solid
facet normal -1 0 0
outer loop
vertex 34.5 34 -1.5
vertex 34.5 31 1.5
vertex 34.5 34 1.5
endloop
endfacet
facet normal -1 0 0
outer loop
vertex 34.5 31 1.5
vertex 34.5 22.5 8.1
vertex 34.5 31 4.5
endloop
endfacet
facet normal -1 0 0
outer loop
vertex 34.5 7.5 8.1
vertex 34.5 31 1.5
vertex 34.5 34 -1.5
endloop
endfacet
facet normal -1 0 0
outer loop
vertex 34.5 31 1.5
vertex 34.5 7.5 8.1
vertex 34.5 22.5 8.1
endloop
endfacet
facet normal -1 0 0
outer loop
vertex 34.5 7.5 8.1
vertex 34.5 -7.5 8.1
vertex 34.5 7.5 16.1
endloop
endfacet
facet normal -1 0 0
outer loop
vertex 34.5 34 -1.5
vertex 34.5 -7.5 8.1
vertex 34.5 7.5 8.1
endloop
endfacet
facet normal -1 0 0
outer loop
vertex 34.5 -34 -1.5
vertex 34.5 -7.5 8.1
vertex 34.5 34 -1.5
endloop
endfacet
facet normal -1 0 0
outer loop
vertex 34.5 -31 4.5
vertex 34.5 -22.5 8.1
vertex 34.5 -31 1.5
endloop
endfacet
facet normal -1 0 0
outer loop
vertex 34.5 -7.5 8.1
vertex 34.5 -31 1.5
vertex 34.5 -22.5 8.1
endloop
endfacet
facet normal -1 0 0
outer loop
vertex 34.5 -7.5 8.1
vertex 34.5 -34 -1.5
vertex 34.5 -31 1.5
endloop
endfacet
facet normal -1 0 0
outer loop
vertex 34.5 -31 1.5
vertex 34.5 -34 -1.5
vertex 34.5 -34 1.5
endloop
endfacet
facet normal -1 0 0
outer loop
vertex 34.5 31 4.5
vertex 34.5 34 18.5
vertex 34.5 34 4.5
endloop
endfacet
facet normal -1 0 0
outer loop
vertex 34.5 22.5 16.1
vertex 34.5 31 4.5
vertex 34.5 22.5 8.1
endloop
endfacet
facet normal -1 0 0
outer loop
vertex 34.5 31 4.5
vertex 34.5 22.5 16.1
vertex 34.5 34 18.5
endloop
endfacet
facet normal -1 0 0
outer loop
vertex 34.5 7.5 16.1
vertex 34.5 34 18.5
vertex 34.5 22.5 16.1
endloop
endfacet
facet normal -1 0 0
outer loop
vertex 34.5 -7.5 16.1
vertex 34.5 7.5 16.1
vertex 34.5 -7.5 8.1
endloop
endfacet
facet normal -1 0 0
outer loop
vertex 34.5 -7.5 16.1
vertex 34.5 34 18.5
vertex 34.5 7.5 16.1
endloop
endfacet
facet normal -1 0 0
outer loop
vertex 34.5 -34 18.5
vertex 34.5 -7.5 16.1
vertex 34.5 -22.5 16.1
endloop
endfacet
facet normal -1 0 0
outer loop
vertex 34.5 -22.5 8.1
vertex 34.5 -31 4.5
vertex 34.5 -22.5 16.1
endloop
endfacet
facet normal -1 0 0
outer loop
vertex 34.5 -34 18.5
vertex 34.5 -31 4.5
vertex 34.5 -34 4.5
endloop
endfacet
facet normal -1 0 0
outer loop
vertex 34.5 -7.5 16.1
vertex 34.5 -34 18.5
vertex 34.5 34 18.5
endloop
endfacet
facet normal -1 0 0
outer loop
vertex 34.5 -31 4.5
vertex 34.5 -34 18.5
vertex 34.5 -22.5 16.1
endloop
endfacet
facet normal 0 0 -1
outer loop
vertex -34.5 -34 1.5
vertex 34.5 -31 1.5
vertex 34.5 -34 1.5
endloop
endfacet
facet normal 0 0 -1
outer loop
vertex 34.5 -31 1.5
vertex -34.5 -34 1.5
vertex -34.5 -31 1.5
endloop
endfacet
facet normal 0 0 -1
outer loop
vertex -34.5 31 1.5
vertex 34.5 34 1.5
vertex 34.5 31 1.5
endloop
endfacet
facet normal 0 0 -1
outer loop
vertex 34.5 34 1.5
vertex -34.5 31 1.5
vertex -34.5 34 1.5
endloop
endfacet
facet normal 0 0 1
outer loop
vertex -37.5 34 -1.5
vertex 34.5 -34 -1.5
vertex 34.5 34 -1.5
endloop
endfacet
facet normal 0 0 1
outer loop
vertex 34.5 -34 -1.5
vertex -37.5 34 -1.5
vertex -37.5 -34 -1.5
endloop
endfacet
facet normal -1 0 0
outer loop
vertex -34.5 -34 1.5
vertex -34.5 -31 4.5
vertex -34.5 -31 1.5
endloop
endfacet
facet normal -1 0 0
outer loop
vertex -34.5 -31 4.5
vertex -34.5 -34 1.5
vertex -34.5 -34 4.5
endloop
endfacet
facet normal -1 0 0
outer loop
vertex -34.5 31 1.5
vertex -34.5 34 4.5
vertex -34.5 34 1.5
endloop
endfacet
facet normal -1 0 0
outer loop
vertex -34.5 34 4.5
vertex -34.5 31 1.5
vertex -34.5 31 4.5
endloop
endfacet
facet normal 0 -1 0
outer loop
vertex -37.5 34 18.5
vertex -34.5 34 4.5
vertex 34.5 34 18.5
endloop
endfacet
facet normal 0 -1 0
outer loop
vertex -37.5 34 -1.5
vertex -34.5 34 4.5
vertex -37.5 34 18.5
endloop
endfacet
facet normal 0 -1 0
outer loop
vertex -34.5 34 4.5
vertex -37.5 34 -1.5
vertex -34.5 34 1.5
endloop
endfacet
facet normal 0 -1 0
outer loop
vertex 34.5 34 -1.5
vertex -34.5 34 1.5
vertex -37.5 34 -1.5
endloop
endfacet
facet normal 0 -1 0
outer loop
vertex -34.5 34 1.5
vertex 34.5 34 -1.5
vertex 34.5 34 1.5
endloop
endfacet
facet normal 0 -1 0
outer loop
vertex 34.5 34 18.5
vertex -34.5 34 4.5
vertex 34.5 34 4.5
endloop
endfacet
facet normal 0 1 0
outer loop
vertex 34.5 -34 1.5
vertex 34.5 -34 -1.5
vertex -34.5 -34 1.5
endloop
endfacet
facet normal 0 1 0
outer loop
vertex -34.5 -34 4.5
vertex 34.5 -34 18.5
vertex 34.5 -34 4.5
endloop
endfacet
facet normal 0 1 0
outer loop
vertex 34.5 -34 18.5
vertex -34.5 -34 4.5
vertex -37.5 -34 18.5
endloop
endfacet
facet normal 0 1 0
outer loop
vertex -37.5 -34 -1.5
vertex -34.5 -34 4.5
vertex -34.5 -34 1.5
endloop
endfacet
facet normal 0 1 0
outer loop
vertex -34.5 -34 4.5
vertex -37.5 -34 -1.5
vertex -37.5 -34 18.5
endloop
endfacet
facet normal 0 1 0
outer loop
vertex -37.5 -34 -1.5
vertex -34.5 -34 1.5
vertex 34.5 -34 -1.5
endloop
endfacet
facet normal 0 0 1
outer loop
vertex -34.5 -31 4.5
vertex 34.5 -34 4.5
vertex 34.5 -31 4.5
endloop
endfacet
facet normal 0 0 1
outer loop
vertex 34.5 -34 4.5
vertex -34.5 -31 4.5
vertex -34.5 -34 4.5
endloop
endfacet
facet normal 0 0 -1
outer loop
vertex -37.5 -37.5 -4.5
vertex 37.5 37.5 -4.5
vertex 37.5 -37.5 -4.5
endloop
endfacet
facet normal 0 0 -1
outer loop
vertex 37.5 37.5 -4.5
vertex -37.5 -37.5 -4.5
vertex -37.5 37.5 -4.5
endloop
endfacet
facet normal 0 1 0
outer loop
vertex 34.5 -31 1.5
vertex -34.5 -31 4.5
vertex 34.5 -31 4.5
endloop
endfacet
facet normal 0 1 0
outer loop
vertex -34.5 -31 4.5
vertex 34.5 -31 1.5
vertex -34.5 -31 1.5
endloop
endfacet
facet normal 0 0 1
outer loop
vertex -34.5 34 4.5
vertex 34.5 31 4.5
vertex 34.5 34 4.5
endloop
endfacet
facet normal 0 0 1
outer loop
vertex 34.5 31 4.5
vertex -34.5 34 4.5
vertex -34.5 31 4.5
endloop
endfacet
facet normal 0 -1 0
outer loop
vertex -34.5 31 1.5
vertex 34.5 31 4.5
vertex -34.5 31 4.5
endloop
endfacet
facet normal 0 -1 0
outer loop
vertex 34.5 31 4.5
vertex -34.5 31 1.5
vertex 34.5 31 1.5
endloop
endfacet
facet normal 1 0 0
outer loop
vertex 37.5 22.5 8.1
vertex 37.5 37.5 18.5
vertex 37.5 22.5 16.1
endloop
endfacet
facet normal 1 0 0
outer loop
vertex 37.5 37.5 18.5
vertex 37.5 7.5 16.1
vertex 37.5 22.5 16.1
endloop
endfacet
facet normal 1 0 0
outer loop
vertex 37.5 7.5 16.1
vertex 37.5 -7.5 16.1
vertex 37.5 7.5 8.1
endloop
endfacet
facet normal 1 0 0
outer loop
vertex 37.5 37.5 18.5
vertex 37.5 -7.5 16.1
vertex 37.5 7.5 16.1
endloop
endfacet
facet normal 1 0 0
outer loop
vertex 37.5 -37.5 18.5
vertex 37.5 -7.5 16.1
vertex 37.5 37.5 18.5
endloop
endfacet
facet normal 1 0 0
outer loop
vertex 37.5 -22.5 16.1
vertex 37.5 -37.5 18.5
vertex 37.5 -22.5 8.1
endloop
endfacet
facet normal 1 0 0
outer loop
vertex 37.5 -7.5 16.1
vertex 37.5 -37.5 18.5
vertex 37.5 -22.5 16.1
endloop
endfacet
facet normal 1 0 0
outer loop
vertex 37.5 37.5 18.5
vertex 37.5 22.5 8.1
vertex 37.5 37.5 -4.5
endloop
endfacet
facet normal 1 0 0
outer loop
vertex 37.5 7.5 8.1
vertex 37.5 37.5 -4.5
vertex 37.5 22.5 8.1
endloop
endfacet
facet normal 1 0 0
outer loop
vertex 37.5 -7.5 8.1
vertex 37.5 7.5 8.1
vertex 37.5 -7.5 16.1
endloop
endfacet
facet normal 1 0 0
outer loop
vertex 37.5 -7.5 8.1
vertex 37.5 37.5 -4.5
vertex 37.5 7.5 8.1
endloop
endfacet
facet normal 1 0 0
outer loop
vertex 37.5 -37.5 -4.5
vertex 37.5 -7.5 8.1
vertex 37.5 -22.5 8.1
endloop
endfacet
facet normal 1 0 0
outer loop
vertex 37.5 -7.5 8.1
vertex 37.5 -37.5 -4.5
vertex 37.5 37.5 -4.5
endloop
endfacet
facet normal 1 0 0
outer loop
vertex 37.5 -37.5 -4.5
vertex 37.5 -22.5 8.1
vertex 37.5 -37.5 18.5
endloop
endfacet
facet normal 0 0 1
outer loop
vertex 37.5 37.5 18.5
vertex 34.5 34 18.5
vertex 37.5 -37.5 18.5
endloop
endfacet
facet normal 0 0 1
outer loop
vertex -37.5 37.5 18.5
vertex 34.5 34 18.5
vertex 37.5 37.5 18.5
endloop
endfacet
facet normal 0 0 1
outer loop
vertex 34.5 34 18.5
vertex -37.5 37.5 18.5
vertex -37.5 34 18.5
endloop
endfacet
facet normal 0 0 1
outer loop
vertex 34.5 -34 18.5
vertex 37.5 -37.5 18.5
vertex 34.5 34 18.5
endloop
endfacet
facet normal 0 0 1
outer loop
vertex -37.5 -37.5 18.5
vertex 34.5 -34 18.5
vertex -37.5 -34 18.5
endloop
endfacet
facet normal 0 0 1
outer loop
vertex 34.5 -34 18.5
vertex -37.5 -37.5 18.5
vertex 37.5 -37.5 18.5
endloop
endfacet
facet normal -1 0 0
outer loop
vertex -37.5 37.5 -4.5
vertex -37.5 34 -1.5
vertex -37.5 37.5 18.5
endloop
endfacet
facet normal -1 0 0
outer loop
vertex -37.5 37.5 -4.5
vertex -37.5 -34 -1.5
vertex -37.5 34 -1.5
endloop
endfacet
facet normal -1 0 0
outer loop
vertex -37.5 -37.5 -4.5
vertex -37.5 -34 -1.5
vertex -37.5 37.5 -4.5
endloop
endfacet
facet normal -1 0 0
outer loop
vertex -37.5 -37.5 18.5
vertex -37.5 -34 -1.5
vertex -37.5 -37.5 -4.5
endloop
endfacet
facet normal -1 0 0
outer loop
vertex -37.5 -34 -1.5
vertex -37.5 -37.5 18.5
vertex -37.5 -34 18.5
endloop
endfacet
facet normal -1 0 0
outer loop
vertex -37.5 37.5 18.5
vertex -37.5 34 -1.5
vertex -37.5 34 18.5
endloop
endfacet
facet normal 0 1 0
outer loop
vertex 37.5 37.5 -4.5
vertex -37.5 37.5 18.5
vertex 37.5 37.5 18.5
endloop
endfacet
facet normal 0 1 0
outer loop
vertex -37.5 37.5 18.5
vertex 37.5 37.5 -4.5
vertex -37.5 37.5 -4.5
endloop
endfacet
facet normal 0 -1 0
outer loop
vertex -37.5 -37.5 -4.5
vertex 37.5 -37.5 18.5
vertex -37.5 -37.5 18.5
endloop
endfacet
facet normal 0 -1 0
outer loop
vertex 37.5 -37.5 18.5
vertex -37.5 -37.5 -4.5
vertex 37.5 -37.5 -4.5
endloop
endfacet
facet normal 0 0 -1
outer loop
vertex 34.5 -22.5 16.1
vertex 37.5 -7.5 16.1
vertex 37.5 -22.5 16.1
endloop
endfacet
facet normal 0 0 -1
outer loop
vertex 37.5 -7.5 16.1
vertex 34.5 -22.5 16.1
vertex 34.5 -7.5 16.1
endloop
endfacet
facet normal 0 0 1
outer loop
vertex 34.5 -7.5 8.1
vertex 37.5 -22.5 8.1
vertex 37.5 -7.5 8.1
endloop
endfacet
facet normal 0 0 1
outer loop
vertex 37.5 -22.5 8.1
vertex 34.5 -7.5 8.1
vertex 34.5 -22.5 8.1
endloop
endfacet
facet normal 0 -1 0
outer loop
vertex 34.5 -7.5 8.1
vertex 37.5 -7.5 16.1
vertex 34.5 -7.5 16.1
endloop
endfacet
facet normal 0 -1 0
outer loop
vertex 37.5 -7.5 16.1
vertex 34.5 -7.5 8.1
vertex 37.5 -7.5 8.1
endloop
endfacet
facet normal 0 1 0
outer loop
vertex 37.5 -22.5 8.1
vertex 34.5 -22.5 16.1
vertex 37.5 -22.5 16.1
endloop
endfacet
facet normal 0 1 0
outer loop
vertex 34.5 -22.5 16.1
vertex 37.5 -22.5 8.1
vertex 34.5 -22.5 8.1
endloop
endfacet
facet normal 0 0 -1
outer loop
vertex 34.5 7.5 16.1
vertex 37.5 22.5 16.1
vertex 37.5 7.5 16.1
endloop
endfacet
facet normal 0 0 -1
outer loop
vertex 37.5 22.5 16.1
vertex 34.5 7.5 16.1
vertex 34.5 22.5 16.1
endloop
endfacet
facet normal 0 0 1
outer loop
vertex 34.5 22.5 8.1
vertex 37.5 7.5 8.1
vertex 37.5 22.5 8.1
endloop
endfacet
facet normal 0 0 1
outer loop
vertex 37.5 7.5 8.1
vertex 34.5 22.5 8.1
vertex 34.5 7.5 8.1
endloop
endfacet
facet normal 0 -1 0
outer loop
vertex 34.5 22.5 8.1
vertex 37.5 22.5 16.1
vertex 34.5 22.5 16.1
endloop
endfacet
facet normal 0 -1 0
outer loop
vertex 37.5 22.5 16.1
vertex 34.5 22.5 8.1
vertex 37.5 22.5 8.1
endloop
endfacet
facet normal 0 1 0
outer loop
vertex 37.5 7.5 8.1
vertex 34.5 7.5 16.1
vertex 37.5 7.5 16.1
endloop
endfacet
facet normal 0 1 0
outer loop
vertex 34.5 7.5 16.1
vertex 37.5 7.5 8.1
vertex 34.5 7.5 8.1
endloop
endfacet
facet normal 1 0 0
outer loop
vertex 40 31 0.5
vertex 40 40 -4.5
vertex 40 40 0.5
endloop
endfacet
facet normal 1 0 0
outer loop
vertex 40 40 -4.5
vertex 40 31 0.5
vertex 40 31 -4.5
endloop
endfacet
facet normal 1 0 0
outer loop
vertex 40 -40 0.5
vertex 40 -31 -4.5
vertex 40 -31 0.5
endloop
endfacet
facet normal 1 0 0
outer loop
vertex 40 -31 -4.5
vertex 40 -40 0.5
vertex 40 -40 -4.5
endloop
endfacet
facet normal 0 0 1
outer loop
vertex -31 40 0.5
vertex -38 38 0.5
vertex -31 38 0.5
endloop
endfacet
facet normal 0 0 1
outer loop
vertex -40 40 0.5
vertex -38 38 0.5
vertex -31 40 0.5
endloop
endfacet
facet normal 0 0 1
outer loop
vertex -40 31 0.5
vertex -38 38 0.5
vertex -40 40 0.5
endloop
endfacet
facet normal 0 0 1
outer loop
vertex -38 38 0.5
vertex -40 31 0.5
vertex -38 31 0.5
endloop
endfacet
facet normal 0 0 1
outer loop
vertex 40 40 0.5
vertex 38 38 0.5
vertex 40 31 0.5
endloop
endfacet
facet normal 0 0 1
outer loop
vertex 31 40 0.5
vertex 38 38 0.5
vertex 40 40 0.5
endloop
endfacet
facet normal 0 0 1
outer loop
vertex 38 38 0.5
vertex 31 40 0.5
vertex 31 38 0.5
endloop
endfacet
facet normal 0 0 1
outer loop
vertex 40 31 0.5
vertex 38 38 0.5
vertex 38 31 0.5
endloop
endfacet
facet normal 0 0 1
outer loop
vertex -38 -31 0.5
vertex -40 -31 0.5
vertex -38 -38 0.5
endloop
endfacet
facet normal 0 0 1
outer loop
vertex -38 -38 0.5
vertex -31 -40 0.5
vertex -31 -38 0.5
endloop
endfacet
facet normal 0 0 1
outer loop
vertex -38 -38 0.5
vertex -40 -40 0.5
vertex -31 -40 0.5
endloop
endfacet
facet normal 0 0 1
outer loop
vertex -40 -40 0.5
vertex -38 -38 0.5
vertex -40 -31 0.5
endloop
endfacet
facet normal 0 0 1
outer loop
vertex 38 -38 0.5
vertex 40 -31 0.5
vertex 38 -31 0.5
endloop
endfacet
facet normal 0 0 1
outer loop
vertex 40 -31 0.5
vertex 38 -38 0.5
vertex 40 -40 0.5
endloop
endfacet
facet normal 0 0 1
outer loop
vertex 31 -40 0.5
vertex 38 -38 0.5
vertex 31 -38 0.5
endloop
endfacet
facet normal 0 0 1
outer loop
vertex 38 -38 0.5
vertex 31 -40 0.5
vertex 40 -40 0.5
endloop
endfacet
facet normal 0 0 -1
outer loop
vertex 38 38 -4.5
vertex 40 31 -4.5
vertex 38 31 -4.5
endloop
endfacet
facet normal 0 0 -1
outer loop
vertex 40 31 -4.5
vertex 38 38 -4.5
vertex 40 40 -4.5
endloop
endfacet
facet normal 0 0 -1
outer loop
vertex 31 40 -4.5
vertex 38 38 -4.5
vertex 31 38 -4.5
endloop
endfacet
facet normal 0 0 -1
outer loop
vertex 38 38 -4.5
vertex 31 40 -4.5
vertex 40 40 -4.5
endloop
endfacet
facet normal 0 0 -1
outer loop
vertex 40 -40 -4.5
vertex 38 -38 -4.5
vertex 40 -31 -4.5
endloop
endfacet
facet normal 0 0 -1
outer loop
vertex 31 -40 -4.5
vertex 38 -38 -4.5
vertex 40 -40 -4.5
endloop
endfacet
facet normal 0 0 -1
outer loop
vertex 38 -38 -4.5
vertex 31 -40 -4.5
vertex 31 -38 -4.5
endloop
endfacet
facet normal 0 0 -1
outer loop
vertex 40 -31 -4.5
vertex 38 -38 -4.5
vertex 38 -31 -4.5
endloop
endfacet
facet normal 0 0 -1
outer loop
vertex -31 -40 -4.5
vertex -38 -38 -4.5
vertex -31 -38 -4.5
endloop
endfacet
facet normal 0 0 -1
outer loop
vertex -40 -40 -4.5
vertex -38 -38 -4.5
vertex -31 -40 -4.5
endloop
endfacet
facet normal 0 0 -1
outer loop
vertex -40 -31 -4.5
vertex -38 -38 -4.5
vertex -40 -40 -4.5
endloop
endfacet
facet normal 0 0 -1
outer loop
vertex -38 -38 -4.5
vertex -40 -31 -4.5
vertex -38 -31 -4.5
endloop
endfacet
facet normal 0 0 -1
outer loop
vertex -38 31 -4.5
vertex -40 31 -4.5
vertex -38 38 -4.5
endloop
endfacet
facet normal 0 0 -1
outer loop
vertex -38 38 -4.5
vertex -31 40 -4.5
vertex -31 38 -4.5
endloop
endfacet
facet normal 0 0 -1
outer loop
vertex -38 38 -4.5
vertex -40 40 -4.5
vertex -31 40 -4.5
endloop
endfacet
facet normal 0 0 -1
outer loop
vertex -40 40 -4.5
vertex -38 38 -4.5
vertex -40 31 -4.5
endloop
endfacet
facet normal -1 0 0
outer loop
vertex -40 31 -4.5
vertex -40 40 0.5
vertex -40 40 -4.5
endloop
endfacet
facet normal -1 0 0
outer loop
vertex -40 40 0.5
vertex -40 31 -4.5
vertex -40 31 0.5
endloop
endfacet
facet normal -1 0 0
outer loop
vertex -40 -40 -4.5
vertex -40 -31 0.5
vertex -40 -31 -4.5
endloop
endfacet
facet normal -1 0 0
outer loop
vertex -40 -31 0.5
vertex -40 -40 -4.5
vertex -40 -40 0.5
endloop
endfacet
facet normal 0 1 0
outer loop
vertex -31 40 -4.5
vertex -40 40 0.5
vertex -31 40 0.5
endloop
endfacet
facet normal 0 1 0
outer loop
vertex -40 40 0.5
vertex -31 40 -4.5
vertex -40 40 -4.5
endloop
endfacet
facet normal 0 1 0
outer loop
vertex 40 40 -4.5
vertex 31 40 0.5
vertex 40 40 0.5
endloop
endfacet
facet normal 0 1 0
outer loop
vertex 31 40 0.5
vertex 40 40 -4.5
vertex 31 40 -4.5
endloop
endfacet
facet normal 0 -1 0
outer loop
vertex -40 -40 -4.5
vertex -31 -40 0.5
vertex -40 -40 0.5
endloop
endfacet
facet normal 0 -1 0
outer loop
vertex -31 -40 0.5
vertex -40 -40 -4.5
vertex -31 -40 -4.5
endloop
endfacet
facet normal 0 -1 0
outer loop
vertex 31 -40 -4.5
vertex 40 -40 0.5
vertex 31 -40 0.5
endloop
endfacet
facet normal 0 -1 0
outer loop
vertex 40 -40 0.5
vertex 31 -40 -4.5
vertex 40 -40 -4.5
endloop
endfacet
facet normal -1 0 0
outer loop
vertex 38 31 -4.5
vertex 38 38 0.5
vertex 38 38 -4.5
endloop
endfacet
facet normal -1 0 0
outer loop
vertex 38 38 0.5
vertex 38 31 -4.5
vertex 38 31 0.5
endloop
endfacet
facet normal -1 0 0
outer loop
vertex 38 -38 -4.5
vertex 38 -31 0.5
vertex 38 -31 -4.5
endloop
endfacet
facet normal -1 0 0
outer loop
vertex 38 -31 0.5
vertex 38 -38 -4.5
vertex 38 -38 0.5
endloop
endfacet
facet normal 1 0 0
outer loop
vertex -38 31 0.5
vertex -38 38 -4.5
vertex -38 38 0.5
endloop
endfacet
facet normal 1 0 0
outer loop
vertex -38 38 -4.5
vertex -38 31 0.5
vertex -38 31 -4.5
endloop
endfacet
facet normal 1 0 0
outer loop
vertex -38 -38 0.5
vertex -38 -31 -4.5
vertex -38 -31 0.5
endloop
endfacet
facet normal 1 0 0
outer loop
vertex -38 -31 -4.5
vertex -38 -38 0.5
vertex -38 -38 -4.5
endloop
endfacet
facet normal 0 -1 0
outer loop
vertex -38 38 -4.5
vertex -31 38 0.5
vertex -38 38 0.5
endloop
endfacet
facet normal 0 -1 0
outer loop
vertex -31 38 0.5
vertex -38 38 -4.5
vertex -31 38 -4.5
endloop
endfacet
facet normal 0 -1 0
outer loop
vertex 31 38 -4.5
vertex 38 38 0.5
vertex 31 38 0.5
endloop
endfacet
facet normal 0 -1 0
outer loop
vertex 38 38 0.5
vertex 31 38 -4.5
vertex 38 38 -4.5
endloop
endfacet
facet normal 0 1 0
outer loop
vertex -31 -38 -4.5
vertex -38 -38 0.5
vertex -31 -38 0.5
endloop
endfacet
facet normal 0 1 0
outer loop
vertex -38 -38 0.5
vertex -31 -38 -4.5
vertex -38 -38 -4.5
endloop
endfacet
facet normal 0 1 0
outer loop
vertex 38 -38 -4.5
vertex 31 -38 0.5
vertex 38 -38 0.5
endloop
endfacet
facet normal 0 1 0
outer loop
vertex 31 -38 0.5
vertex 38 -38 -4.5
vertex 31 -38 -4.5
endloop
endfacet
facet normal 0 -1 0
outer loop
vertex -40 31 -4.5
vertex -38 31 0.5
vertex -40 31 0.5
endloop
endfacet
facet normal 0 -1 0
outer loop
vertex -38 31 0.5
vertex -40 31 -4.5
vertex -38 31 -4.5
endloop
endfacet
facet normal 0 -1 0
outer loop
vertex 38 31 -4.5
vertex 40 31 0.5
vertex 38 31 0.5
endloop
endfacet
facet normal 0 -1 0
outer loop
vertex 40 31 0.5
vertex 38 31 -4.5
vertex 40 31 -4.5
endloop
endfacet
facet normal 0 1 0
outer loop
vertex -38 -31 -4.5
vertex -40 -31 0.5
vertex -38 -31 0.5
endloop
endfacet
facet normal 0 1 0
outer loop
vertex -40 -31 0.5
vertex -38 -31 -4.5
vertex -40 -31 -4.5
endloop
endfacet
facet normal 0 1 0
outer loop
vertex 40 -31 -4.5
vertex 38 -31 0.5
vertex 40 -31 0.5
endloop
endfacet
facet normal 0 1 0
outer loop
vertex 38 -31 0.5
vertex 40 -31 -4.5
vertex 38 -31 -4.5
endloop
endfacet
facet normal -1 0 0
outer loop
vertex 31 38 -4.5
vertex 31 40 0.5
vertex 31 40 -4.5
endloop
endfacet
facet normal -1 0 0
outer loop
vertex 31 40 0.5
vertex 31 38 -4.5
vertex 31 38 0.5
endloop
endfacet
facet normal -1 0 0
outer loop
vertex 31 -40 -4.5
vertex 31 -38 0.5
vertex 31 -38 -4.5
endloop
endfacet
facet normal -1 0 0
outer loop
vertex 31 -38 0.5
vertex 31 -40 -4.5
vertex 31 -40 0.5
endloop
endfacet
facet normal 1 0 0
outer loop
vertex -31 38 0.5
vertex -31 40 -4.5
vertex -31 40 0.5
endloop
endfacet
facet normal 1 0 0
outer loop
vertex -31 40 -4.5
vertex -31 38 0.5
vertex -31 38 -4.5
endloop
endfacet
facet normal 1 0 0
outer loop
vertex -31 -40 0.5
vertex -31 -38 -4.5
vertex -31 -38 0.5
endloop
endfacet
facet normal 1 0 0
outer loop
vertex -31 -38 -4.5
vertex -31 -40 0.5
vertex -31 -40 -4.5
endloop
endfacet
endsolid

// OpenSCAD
module ioio() {
	for(i = [ [ 31.25,  12.5,  0],
		[31.25, -12.5, 0],
		[-31.25, 12.5, 0],
		[-31.25, -12.5, 0]])
	{
		translate(i)
		cylinder(r=2.5, h=6);
	}
}

module dual_holder() {
	translate([0,-15.5,0]) ioio();
	translate([0,15.5,0]) ioio();

	difference() {
		difference() {
			cube(size=[69,68,3], center=true);
			translate([0,-15,0]) cube(size=[50,20, 4], center=true);
		}
		translate([0,15,0]) cube(size=[50,20, 4], center=true);
	}
}


//color("SteelBlue") dual_holder();

difference() {
	translate([0,-32.5,0]) cube(size=[69,3,9], center=true);
	dual_holder();
}
difference() {
	translate([0,32.5,0]) cube(size=[69,3,9], center=true);
	dual_holder();
}

difference() {
	difference() {
		difference() {
			difference() {
				translate([0,0,23/2-4.5]) cube(size=[75,75,23], center=true);
				translate([0,0,23/2-1.5]) cube(size=[69,68,23], center=true);		
			}	
			translate([36,-15,12.1]) cube([5,15,8], center=true);
		}
		translate([36,15,12.1]) cube([5,15,8], center=true);
	}
	translate([-36,0,23/2-1.5]) cube(size=[7,68,23], center=true);
}

difference() {
difference() {
difference() {
	translate([0,0,-2]) cube(size=[80,80,5], center=true);
	translate([0,0,-2]) cube(size=[76,76,6], center=true);
}
translate([0,0,-2]) cube(size=[85,62,6], center=true);
}
translate([0,0,-2]) cube(size=[62,85,6], center=true);
}
